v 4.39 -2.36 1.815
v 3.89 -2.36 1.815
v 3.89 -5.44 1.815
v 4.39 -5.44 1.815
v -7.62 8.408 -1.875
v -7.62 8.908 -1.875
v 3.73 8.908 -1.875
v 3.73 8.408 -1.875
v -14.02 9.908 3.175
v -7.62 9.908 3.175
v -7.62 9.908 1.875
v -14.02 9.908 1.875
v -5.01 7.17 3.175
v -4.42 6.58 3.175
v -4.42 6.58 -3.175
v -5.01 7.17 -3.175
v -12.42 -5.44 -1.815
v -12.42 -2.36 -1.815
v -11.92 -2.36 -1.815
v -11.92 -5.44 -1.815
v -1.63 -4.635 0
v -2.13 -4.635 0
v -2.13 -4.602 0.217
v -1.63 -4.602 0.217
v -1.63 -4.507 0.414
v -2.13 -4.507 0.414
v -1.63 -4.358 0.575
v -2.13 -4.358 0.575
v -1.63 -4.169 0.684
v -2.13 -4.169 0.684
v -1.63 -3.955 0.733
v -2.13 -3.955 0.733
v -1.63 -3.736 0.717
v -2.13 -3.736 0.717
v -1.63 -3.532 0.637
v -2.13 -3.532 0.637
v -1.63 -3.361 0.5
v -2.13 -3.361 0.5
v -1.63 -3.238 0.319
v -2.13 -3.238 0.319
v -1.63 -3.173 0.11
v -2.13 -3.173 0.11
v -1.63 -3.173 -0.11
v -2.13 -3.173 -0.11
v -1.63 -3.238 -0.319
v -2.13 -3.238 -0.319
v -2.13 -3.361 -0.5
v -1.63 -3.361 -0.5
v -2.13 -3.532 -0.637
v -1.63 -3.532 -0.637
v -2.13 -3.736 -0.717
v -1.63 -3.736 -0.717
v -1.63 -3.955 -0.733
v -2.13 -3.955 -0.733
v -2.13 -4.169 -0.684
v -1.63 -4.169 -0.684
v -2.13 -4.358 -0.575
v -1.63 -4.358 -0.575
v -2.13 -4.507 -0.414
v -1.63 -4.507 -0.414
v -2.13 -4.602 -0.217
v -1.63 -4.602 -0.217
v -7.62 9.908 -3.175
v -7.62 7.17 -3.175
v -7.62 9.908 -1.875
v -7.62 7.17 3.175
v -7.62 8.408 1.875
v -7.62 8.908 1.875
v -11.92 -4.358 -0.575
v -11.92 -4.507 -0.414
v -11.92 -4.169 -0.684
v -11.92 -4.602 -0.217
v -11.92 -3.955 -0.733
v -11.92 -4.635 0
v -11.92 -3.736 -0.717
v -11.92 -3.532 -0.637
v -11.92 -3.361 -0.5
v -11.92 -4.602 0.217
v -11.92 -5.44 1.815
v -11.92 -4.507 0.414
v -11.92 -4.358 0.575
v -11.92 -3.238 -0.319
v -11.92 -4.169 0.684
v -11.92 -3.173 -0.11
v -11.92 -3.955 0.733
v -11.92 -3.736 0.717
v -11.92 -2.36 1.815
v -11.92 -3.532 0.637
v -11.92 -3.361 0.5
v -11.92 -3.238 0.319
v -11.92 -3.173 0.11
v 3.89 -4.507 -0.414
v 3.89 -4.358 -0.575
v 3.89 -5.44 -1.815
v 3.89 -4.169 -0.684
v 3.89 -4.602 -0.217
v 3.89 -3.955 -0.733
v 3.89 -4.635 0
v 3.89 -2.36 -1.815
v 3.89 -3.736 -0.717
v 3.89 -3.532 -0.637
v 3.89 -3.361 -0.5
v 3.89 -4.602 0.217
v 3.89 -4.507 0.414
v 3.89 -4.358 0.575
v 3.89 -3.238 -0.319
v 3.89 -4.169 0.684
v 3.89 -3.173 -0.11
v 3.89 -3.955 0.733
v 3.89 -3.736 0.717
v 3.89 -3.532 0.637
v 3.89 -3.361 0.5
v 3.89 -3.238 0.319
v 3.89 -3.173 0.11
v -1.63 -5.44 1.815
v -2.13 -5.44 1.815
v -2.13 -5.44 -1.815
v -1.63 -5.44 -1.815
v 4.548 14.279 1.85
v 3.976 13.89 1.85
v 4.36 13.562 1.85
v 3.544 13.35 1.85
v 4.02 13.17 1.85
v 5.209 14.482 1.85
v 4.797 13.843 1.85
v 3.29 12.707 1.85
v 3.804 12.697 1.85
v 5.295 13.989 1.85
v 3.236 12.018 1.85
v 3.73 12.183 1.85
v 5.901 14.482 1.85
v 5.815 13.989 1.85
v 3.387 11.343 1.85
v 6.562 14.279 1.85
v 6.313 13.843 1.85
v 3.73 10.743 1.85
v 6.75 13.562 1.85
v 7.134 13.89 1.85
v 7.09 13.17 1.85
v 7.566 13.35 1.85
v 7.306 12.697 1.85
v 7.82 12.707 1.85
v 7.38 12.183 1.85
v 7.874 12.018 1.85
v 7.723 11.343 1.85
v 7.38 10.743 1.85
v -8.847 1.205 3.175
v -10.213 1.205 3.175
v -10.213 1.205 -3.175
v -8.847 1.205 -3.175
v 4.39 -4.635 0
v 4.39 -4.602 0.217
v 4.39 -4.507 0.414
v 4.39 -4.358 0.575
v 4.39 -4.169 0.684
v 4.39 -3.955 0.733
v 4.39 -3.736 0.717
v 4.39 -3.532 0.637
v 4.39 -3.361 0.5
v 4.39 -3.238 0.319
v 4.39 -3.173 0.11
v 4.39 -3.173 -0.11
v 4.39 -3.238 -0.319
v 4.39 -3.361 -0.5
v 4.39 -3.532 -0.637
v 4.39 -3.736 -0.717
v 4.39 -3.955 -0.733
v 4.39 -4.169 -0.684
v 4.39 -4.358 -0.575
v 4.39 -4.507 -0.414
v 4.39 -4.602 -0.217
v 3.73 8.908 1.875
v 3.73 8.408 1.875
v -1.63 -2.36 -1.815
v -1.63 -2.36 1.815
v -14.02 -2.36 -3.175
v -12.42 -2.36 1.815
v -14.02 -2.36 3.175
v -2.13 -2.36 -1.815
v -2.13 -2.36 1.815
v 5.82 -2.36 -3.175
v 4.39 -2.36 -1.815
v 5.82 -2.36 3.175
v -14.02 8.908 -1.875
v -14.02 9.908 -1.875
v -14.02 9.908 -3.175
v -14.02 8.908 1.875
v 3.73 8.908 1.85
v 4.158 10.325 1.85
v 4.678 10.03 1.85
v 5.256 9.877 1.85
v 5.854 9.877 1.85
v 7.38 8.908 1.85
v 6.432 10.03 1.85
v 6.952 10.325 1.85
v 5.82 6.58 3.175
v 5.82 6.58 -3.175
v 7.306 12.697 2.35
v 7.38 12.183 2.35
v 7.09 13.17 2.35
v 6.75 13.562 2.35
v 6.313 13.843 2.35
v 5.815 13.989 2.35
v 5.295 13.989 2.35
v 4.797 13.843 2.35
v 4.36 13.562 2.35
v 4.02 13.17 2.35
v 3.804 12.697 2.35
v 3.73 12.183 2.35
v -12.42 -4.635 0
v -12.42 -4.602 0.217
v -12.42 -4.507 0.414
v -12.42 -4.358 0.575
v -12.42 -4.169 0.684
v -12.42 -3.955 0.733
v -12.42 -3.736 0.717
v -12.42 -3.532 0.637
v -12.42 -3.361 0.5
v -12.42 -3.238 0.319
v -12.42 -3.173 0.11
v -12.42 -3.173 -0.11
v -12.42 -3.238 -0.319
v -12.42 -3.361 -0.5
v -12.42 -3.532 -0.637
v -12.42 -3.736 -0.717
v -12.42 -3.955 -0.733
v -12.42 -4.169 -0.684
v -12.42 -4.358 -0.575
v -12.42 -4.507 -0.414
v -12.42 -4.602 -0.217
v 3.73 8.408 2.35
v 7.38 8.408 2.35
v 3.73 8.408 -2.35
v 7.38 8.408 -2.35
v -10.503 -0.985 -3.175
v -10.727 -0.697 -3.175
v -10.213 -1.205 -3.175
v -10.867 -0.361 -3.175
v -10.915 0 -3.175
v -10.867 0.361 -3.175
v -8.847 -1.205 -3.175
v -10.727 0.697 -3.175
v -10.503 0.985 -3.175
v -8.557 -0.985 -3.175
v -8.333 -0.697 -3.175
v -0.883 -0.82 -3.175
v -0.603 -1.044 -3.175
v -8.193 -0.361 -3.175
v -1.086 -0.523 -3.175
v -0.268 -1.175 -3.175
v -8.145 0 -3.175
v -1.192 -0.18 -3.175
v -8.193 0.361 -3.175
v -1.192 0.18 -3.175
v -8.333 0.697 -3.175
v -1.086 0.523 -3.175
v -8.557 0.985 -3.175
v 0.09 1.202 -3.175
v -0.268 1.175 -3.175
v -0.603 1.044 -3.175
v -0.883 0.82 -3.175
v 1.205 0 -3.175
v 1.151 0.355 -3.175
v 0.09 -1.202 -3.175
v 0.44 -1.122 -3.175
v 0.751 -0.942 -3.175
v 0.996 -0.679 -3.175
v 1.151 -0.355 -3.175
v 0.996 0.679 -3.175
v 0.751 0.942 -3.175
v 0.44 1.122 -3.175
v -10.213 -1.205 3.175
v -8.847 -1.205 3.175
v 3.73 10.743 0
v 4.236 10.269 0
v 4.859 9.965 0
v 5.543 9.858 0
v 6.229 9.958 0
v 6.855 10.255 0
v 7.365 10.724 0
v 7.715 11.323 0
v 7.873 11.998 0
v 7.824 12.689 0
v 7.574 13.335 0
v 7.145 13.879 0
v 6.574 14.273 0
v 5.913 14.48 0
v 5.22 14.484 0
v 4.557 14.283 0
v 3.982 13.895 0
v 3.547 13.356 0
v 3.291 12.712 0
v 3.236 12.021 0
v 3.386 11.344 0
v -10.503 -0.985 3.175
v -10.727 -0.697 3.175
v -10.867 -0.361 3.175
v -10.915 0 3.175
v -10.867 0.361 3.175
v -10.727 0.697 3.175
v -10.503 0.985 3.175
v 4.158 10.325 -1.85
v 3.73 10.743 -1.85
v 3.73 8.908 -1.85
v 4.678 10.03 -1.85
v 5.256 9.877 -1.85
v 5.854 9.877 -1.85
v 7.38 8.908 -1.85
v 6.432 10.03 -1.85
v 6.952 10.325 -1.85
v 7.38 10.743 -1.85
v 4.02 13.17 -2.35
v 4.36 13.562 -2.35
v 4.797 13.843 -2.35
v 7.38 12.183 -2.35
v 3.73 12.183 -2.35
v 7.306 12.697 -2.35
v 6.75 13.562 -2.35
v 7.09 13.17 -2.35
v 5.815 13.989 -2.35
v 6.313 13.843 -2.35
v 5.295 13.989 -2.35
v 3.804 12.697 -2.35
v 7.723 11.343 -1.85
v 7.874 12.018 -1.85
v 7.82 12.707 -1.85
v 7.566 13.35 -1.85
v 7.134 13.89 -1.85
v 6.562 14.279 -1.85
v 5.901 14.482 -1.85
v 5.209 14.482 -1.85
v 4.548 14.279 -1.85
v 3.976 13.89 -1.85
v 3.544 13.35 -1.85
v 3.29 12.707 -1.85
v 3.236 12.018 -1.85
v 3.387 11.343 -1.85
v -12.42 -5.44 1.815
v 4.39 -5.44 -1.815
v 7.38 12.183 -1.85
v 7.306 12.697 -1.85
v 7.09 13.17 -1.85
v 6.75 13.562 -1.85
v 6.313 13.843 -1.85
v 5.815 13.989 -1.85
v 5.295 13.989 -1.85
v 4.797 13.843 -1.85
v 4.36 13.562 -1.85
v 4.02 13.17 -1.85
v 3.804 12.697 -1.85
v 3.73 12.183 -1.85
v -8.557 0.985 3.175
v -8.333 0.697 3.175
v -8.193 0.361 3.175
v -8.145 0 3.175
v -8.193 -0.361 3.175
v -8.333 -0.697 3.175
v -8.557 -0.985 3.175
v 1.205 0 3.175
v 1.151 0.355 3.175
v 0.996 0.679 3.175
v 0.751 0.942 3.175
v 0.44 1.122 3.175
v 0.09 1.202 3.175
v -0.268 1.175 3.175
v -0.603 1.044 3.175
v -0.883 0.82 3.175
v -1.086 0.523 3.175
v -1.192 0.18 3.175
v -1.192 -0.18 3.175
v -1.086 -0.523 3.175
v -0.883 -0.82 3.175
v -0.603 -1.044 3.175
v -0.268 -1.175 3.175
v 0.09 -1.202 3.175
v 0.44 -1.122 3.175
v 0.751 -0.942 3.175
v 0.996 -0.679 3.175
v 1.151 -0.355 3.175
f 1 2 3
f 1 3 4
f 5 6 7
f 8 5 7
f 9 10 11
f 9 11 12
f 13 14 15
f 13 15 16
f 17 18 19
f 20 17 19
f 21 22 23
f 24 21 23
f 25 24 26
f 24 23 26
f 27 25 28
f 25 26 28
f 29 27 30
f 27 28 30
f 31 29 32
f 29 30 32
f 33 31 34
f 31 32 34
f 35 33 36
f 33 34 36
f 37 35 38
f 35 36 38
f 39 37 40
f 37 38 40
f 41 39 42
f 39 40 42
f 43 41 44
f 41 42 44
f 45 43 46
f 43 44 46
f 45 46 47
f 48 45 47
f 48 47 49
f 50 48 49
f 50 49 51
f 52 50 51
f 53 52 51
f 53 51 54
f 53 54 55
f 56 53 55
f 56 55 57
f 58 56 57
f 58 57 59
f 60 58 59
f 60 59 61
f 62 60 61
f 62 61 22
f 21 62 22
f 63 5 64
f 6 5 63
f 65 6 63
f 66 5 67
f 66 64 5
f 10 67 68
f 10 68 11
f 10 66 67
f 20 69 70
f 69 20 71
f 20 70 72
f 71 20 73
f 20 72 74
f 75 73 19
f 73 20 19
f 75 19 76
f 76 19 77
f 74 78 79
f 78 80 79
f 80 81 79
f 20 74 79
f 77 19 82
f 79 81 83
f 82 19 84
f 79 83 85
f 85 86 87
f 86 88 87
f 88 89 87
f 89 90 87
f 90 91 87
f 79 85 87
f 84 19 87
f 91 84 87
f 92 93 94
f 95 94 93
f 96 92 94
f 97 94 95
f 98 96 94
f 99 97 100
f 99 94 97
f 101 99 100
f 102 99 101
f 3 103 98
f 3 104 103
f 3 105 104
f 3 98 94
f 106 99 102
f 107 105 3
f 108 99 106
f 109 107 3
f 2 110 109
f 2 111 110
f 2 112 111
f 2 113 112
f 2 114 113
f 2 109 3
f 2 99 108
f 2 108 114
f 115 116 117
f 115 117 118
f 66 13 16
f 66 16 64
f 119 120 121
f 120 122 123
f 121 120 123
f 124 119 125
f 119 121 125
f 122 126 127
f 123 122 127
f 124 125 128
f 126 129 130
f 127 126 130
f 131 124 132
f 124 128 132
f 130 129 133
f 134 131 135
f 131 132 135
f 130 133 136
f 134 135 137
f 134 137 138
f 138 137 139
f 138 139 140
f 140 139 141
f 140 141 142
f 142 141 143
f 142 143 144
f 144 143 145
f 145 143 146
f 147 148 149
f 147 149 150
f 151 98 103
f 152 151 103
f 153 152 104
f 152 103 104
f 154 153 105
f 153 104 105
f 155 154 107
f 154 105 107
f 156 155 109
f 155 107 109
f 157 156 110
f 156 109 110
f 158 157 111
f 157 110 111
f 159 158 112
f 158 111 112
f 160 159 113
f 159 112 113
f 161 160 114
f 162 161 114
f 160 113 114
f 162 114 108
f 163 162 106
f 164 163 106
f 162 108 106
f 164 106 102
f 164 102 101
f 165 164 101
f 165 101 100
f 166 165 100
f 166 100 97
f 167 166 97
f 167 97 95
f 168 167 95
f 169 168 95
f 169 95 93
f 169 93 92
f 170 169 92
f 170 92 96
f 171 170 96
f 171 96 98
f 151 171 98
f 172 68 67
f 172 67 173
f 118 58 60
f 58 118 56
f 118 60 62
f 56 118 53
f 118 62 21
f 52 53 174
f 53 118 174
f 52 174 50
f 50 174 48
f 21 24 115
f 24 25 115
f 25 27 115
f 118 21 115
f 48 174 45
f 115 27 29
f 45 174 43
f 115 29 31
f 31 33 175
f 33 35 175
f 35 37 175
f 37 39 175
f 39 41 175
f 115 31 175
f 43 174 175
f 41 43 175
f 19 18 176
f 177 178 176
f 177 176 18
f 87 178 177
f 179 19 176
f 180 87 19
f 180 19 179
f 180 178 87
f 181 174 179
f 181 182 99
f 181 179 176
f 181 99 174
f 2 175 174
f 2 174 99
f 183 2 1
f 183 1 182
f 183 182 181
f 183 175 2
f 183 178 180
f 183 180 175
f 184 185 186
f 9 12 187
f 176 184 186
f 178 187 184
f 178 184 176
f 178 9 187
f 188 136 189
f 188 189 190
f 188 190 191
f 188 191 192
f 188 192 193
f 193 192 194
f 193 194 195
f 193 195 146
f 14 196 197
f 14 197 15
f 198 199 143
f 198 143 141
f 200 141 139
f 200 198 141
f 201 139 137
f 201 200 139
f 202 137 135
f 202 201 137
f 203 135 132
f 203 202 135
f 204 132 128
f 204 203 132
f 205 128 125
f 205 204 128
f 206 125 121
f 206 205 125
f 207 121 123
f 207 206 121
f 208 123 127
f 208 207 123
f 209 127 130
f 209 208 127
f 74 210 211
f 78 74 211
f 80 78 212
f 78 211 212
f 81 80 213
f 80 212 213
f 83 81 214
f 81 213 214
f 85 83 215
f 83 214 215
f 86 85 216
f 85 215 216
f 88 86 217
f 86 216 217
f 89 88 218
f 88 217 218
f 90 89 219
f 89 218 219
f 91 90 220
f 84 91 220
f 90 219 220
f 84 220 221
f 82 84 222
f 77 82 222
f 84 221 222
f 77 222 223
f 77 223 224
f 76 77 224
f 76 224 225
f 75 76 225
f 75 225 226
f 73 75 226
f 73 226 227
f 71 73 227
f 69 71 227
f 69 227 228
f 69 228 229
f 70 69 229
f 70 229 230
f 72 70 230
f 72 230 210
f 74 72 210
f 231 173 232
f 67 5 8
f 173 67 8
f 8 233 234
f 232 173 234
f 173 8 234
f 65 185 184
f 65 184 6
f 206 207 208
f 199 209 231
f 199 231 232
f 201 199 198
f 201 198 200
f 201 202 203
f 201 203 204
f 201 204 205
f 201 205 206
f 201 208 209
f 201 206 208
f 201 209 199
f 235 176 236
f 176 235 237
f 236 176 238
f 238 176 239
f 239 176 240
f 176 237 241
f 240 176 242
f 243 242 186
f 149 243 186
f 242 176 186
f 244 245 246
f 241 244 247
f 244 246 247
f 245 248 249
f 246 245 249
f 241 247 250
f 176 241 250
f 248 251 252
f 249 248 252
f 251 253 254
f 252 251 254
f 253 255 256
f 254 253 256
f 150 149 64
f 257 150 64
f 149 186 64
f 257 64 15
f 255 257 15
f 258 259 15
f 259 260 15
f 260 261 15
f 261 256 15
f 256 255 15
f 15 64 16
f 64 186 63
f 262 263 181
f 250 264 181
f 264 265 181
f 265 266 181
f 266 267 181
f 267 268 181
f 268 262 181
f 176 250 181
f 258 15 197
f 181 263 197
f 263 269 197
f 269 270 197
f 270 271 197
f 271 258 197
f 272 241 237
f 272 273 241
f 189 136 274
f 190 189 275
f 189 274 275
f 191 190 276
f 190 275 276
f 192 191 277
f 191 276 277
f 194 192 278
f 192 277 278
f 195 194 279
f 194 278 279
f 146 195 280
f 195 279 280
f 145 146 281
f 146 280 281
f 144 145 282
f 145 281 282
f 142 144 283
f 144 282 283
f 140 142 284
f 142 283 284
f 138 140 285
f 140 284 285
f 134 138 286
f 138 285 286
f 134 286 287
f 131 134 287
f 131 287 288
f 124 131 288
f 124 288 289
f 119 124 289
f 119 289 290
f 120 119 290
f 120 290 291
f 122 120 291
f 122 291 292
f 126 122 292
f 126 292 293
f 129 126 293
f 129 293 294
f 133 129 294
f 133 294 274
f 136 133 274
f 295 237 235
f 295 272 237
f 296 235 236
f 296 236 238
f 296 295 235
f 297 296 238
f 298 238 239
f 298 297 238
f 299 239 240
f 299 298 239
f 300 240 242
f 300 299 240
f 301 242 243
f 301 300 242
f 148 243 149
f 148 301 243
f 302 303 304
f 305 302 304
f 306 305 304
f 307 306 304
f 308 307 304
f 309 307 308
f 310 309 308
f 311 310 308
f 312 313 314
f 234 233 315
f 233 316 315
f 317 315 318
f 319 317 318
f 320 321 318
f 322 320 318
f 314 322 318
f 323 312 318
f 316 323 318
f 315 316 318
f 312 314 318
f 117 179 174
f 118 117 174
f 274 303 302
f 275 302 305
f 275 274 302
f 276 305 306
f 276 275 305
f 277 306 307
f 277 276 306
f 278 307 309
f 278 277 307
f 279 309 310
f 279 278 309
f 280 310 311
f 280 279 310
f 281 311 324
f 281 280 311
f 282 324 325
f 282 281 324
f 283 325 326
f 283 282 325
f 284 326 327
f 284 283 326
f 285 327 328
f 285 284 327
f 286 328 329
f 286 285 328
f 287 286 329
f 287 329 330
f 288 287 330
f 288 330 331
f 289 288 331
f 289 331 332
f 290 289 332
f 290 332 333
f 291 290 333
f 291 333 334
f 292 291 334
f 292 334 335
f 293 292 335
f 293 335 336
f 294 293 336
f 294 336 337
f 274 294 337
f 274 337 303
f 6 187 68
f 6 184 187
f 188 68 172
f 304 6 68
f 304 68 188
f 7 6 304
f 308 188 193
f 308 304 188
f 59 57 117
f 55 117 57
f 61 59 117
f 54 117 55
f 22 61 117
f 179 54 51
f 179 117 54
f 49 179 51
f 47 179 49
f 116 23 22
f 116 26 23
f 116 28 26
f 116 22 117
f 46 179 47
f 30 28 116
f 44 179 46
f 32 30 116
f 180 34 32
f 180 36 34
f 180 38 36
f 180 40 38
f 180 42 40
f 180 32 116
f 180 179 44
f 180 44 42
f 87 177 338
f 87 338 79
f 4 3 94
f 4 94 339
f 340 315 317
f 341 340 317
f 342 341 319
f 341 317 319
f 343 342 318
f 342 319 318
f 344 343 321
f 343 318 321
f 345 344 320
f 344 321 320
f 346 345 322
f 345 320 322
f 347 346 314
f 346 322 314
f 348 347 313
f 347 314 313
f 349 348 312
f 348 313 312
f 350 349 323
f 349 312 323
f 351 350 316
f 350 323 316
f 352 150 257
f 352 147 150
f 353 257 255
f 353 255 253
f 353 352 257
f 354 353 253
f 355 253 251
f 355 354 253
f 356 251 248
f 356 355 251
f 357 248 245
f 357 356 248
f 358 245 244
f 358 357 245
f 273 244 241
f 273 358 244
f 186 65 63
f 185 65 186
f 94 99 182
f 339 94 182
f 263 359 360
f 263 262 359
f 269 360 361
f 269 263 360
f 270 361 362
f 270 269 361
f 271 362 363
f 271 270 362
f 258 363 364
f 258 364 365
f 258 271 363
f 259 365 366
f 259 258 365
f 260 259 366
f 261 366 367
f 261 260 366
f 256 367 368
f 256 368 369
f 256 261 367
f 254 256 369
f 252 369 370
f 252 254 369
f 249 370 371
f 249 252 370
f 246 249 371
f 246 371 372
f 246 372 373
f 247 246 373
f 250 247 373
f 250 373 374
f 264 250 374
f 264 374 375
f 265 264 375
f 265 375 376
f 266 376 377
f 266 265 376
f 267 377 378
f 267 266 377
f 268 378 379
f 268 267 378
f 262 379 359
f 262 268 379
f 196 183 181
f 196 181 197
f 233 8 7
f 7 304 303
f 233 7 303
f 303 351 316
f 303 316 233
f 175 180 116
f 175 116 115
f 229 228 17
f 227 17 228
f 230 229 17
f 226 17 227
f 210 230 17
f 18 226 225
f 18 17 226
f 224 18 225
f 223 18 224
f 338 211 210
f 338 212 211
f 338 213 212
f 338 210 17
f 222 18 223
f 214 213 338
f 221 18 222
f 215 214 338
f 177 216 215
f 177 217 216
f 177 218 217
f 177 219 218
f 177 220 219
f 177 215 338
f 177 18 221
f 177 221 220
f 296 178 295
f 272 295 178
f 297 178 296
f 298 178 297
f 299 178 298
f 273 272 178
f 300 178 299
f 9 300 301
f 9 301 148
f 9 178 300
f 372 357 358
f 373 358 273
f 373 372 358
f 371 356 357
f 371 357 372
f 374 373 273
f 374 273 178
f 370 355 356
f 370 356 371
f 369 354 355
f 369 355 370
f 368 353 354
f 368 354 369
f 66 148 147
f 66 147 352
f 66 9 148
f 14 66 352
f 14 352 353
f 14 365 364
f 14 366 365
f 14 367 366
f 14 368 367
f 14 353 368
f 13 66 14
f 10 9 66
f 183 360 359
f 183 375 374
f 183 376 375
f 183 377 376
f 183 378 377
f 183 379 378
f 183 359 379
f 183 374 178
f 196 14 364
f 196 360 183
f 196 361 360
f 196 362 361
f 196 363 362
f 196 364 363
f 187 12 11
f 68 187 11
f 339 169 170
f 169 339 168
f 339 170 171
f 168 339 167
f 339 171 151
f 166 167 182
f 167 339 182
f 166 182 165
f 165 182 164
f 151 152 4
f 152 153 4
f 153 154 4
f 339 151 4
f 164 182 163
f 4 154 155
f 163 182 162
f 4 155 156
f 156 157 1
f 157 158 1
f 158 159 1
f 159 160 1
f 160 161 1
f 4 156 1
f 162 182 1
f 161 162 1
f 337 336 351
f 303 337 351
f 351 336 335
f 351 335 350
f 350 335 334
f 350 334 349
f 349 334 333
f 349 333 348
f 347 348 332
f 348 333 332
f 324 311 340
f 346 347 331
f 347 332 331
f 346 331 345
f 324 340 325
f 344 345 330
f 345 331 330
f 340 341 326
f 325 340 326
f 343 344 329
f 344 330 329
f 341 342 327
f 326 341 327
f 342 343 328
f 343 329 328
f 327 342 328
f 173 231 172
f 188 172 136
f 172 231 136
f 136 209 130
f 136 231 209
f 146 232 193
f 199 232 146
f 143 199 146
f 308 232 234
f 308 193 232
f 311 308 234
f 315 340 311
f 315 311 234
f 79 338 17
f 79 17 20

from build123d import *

# Parameters (mm, degrees)
SKETCH_1_R                  = 1.205
EXTRUDE_1_DEPTH             = 3.175
SKETCH_2_W                  = 0.5
SKETCH_2_H                  = 3.63
EXTRUDE_2_DEPTH             = 3.08
SKETCH_3_R                  = 0.735
CUT_EXTRUDE_1_DEPTH         = 21.998730652
SKETCH_4_W                  = 6.4
SKETCH_4_H                  = 3.75
CUT_EXTRUDE_2_DEPTH         = 1
SKETCH_6_W                  = 21.4
SKETCH_6_H                  = 3.75
EXTRUDE_3_DEPTH             = 0.5
SKETCH_7_W                  = 3.65
SKETCH_7_H                  = 4.7
EXTRUDE_4_DEPTH             = 0.5
EXTRUDE_5_DEPTH             = 0.5
EXTRUDE_7_REACH             = 22.071
SKETCH_9_R                  = 2.325
EXTRUDE_7_DIRECTION_2_REACH = 22.071


with BuildPart() as part:
    # 스케치1 → 보스-돌출1 (new, symmetric)
    with BuildSketch(Plane.XY):
        Polygon((-14.02, -2.36), (5.82, -2.36), (5.82, 6.58), (-4.42, 6.58), (-5.01, 7.17), (-7.62, 7.17), (-7.62, 9.908), (-14.02, 9.908), (-14.02, 6.58), align=None)
        Circle(SKETCH_1_R, mode=Mode.SUBTRACT)
        with BuildLine():
            Line((-10.212788401, 1.205), (-8.847211599, 1.205))
            ThreePointArc((-8.847211599, 1.205), (-8.145, 0), (-8.847211599, -1.205))
            Line((-8.847211599, -1.205), (-10.212788401, -1.205))
            ThreePointArc((-10.212788401, -1.205), (-10.915, 0), (-10.212788401, 1.205))
        make_face(mode=Mode.SUBTRACT)
    extrude(amount=EXTRUDE_1_DEPTH, both=True)

    # 스케치2 → 보스-돌출2 (add)
    with BuildSketch(Plane.XZ.offset(2.36)):
        with Locations((-12.17, 0)):
            Rectangle(SKETCH_2_W, SKETCH_2_H)
        with Locations((-1.88, 0)):
            Rectangle(SKETCH_2_W, SKETCH_2_H)
        with Locations((4.14, 0)):
            Rectangle(SKETCH_2_W, SKETCH_2_H)
    extrude(amount=EXTRUDE_2_DEPTH)

    # 스케치3 → 컷-돌출1 (cut, through all)
    with BuildSketch(Plane.ZY.offset(12.42)):
        with Locations(Location((0, -3.9, 0), (0, 0, 270))):
            Circle(SKETCH_3_R)
    extrude(amount=-CUT_EXTRUDE_1_DEPTH, mode=Mode.SUBTRACT)

    # 스케치4 → 컷-돌출2 (cut)
    with BuildSketch(Plane(origin=(0, 9.908, 0), x_dir=(1, 0, 0), z_dir=(0, 1, 0))):
        with Locations((-10.82, 0)):
            Rectangle(SKETCH_4_W, SKETCH_4_H)
    extrude(amount=-CUT_EXTRUDE_2_DEPTH, mode=Mode.SUBTRACT)

    # 스케치6 → 보스-돌출3 (add)
    with BuildSketch(Plane(origin=(0, 8.908, 0), x_dir=(1, 0, 0), z_dir=(0, 1, 0))):
        with Locations((-3.32, 0)):
            Rectangle(SKETCH_6_W, SKETCH_6_H)
    extrude(amount=-EXTRUDE_3_DEPTH)

    # 스케치7 → 보스-돌출4 (add)
    with BuildSketch(Plane(origin=(0, 8.908, 0), x_dir=(1, 0, 0), z_dir=(0, 1, 0))):
        with Locations((5.555, 0)):
            Rectangle(SKETCH_7_W, SKETCH_7_H)
    extrude(amount=-EXTRUDE_4_DEPTH)

    # 스케치8 → 보스-돌출5 (add)
    with BuildSketch(Plane.XY.offset(2.35)):
        with BuildLine():
            Line((3.73, 8.408), (7.38, 8.408))
            Line((7.38, 8.408), (7.38, 12.183))
            ThreePointArc((7.38, 12.183), (5.555, 14.008), (3.73, 12.183))
            Line((3.73, 12.183), (3.73, 8.408))
        make_face()
    extrude_5 = extrude(amount=-EXTRUDE_5_DEPTH)

    # 대칭 복사1: 보스-돌출5 across plane
    add(extrude_5.mirror(Plane.XY))

    # 보스-돌출7: up to this face of the body (flat: up to its plane)
    extrude_7_end = Plane(part.part.faces().sort_by_distance((5.555, 11.279795549, 1.85))[0])
    # 스케치9 → 보스-돌출7 (add, up to the picked face)
    with BuildSketch(Plane.XY, mode=Mode.PRIVATE) as extrude_7_sk1:
        with Locations(Location((5.555, 12.183, 0), (0, 0, 218.284293925))):
            Circle(SKETCH_9_R)
    extrude_7_tool1 = split(extrude(extrude_7_sk1.sketch, amount=EXTRUDE_7_REACH, mode=Mode.PRIVATE), bisect_by=extrude_7_end, keep=Keep.BOTH, mode=Mode.PRIVATE)
    add(extrude_7_tool1.solids().sort_by(Axis((5.555, 12.183, 0), (0, 0, 1)))[0])

    # 보스-돌출7 direction 2: up to this face of the body (flat: up to its plane)
    extrude_7_direction_2_end = Plane(part.part.faces().sort_by_distance((5.555, 11.279795549, -1.85))[0])
    # 스케치9 → 보스-돌출7 direction 2 (add, up to the picked face)
    with BuildSketch(Plane.XY, mode=Mode.PRIVATE) as extrude_7_direction_2_sk1:
        with Locations(Location((5.555, 12.183, 0), (0, 0, 218.284293925))):
            Circle(SKETCH_9_R)
    extrude_7_direction_2_tool1 = split(extrude(extrude_7_direction_2_sk1.sketch, amount=-EXTRUDE_7_DIRECTION_2_REACH, mode=Mode.PRIVATE), bisect_by=extrude_7_direction_2_end, keep=Keep.BOTH, mode=Mode.PRIVATE)
    add(extrude_7_direction_2_tool1.solids().sort_by(Axis((5.555, 12.183, 0), (0, 0, -1)))[0])


solid = part.part
